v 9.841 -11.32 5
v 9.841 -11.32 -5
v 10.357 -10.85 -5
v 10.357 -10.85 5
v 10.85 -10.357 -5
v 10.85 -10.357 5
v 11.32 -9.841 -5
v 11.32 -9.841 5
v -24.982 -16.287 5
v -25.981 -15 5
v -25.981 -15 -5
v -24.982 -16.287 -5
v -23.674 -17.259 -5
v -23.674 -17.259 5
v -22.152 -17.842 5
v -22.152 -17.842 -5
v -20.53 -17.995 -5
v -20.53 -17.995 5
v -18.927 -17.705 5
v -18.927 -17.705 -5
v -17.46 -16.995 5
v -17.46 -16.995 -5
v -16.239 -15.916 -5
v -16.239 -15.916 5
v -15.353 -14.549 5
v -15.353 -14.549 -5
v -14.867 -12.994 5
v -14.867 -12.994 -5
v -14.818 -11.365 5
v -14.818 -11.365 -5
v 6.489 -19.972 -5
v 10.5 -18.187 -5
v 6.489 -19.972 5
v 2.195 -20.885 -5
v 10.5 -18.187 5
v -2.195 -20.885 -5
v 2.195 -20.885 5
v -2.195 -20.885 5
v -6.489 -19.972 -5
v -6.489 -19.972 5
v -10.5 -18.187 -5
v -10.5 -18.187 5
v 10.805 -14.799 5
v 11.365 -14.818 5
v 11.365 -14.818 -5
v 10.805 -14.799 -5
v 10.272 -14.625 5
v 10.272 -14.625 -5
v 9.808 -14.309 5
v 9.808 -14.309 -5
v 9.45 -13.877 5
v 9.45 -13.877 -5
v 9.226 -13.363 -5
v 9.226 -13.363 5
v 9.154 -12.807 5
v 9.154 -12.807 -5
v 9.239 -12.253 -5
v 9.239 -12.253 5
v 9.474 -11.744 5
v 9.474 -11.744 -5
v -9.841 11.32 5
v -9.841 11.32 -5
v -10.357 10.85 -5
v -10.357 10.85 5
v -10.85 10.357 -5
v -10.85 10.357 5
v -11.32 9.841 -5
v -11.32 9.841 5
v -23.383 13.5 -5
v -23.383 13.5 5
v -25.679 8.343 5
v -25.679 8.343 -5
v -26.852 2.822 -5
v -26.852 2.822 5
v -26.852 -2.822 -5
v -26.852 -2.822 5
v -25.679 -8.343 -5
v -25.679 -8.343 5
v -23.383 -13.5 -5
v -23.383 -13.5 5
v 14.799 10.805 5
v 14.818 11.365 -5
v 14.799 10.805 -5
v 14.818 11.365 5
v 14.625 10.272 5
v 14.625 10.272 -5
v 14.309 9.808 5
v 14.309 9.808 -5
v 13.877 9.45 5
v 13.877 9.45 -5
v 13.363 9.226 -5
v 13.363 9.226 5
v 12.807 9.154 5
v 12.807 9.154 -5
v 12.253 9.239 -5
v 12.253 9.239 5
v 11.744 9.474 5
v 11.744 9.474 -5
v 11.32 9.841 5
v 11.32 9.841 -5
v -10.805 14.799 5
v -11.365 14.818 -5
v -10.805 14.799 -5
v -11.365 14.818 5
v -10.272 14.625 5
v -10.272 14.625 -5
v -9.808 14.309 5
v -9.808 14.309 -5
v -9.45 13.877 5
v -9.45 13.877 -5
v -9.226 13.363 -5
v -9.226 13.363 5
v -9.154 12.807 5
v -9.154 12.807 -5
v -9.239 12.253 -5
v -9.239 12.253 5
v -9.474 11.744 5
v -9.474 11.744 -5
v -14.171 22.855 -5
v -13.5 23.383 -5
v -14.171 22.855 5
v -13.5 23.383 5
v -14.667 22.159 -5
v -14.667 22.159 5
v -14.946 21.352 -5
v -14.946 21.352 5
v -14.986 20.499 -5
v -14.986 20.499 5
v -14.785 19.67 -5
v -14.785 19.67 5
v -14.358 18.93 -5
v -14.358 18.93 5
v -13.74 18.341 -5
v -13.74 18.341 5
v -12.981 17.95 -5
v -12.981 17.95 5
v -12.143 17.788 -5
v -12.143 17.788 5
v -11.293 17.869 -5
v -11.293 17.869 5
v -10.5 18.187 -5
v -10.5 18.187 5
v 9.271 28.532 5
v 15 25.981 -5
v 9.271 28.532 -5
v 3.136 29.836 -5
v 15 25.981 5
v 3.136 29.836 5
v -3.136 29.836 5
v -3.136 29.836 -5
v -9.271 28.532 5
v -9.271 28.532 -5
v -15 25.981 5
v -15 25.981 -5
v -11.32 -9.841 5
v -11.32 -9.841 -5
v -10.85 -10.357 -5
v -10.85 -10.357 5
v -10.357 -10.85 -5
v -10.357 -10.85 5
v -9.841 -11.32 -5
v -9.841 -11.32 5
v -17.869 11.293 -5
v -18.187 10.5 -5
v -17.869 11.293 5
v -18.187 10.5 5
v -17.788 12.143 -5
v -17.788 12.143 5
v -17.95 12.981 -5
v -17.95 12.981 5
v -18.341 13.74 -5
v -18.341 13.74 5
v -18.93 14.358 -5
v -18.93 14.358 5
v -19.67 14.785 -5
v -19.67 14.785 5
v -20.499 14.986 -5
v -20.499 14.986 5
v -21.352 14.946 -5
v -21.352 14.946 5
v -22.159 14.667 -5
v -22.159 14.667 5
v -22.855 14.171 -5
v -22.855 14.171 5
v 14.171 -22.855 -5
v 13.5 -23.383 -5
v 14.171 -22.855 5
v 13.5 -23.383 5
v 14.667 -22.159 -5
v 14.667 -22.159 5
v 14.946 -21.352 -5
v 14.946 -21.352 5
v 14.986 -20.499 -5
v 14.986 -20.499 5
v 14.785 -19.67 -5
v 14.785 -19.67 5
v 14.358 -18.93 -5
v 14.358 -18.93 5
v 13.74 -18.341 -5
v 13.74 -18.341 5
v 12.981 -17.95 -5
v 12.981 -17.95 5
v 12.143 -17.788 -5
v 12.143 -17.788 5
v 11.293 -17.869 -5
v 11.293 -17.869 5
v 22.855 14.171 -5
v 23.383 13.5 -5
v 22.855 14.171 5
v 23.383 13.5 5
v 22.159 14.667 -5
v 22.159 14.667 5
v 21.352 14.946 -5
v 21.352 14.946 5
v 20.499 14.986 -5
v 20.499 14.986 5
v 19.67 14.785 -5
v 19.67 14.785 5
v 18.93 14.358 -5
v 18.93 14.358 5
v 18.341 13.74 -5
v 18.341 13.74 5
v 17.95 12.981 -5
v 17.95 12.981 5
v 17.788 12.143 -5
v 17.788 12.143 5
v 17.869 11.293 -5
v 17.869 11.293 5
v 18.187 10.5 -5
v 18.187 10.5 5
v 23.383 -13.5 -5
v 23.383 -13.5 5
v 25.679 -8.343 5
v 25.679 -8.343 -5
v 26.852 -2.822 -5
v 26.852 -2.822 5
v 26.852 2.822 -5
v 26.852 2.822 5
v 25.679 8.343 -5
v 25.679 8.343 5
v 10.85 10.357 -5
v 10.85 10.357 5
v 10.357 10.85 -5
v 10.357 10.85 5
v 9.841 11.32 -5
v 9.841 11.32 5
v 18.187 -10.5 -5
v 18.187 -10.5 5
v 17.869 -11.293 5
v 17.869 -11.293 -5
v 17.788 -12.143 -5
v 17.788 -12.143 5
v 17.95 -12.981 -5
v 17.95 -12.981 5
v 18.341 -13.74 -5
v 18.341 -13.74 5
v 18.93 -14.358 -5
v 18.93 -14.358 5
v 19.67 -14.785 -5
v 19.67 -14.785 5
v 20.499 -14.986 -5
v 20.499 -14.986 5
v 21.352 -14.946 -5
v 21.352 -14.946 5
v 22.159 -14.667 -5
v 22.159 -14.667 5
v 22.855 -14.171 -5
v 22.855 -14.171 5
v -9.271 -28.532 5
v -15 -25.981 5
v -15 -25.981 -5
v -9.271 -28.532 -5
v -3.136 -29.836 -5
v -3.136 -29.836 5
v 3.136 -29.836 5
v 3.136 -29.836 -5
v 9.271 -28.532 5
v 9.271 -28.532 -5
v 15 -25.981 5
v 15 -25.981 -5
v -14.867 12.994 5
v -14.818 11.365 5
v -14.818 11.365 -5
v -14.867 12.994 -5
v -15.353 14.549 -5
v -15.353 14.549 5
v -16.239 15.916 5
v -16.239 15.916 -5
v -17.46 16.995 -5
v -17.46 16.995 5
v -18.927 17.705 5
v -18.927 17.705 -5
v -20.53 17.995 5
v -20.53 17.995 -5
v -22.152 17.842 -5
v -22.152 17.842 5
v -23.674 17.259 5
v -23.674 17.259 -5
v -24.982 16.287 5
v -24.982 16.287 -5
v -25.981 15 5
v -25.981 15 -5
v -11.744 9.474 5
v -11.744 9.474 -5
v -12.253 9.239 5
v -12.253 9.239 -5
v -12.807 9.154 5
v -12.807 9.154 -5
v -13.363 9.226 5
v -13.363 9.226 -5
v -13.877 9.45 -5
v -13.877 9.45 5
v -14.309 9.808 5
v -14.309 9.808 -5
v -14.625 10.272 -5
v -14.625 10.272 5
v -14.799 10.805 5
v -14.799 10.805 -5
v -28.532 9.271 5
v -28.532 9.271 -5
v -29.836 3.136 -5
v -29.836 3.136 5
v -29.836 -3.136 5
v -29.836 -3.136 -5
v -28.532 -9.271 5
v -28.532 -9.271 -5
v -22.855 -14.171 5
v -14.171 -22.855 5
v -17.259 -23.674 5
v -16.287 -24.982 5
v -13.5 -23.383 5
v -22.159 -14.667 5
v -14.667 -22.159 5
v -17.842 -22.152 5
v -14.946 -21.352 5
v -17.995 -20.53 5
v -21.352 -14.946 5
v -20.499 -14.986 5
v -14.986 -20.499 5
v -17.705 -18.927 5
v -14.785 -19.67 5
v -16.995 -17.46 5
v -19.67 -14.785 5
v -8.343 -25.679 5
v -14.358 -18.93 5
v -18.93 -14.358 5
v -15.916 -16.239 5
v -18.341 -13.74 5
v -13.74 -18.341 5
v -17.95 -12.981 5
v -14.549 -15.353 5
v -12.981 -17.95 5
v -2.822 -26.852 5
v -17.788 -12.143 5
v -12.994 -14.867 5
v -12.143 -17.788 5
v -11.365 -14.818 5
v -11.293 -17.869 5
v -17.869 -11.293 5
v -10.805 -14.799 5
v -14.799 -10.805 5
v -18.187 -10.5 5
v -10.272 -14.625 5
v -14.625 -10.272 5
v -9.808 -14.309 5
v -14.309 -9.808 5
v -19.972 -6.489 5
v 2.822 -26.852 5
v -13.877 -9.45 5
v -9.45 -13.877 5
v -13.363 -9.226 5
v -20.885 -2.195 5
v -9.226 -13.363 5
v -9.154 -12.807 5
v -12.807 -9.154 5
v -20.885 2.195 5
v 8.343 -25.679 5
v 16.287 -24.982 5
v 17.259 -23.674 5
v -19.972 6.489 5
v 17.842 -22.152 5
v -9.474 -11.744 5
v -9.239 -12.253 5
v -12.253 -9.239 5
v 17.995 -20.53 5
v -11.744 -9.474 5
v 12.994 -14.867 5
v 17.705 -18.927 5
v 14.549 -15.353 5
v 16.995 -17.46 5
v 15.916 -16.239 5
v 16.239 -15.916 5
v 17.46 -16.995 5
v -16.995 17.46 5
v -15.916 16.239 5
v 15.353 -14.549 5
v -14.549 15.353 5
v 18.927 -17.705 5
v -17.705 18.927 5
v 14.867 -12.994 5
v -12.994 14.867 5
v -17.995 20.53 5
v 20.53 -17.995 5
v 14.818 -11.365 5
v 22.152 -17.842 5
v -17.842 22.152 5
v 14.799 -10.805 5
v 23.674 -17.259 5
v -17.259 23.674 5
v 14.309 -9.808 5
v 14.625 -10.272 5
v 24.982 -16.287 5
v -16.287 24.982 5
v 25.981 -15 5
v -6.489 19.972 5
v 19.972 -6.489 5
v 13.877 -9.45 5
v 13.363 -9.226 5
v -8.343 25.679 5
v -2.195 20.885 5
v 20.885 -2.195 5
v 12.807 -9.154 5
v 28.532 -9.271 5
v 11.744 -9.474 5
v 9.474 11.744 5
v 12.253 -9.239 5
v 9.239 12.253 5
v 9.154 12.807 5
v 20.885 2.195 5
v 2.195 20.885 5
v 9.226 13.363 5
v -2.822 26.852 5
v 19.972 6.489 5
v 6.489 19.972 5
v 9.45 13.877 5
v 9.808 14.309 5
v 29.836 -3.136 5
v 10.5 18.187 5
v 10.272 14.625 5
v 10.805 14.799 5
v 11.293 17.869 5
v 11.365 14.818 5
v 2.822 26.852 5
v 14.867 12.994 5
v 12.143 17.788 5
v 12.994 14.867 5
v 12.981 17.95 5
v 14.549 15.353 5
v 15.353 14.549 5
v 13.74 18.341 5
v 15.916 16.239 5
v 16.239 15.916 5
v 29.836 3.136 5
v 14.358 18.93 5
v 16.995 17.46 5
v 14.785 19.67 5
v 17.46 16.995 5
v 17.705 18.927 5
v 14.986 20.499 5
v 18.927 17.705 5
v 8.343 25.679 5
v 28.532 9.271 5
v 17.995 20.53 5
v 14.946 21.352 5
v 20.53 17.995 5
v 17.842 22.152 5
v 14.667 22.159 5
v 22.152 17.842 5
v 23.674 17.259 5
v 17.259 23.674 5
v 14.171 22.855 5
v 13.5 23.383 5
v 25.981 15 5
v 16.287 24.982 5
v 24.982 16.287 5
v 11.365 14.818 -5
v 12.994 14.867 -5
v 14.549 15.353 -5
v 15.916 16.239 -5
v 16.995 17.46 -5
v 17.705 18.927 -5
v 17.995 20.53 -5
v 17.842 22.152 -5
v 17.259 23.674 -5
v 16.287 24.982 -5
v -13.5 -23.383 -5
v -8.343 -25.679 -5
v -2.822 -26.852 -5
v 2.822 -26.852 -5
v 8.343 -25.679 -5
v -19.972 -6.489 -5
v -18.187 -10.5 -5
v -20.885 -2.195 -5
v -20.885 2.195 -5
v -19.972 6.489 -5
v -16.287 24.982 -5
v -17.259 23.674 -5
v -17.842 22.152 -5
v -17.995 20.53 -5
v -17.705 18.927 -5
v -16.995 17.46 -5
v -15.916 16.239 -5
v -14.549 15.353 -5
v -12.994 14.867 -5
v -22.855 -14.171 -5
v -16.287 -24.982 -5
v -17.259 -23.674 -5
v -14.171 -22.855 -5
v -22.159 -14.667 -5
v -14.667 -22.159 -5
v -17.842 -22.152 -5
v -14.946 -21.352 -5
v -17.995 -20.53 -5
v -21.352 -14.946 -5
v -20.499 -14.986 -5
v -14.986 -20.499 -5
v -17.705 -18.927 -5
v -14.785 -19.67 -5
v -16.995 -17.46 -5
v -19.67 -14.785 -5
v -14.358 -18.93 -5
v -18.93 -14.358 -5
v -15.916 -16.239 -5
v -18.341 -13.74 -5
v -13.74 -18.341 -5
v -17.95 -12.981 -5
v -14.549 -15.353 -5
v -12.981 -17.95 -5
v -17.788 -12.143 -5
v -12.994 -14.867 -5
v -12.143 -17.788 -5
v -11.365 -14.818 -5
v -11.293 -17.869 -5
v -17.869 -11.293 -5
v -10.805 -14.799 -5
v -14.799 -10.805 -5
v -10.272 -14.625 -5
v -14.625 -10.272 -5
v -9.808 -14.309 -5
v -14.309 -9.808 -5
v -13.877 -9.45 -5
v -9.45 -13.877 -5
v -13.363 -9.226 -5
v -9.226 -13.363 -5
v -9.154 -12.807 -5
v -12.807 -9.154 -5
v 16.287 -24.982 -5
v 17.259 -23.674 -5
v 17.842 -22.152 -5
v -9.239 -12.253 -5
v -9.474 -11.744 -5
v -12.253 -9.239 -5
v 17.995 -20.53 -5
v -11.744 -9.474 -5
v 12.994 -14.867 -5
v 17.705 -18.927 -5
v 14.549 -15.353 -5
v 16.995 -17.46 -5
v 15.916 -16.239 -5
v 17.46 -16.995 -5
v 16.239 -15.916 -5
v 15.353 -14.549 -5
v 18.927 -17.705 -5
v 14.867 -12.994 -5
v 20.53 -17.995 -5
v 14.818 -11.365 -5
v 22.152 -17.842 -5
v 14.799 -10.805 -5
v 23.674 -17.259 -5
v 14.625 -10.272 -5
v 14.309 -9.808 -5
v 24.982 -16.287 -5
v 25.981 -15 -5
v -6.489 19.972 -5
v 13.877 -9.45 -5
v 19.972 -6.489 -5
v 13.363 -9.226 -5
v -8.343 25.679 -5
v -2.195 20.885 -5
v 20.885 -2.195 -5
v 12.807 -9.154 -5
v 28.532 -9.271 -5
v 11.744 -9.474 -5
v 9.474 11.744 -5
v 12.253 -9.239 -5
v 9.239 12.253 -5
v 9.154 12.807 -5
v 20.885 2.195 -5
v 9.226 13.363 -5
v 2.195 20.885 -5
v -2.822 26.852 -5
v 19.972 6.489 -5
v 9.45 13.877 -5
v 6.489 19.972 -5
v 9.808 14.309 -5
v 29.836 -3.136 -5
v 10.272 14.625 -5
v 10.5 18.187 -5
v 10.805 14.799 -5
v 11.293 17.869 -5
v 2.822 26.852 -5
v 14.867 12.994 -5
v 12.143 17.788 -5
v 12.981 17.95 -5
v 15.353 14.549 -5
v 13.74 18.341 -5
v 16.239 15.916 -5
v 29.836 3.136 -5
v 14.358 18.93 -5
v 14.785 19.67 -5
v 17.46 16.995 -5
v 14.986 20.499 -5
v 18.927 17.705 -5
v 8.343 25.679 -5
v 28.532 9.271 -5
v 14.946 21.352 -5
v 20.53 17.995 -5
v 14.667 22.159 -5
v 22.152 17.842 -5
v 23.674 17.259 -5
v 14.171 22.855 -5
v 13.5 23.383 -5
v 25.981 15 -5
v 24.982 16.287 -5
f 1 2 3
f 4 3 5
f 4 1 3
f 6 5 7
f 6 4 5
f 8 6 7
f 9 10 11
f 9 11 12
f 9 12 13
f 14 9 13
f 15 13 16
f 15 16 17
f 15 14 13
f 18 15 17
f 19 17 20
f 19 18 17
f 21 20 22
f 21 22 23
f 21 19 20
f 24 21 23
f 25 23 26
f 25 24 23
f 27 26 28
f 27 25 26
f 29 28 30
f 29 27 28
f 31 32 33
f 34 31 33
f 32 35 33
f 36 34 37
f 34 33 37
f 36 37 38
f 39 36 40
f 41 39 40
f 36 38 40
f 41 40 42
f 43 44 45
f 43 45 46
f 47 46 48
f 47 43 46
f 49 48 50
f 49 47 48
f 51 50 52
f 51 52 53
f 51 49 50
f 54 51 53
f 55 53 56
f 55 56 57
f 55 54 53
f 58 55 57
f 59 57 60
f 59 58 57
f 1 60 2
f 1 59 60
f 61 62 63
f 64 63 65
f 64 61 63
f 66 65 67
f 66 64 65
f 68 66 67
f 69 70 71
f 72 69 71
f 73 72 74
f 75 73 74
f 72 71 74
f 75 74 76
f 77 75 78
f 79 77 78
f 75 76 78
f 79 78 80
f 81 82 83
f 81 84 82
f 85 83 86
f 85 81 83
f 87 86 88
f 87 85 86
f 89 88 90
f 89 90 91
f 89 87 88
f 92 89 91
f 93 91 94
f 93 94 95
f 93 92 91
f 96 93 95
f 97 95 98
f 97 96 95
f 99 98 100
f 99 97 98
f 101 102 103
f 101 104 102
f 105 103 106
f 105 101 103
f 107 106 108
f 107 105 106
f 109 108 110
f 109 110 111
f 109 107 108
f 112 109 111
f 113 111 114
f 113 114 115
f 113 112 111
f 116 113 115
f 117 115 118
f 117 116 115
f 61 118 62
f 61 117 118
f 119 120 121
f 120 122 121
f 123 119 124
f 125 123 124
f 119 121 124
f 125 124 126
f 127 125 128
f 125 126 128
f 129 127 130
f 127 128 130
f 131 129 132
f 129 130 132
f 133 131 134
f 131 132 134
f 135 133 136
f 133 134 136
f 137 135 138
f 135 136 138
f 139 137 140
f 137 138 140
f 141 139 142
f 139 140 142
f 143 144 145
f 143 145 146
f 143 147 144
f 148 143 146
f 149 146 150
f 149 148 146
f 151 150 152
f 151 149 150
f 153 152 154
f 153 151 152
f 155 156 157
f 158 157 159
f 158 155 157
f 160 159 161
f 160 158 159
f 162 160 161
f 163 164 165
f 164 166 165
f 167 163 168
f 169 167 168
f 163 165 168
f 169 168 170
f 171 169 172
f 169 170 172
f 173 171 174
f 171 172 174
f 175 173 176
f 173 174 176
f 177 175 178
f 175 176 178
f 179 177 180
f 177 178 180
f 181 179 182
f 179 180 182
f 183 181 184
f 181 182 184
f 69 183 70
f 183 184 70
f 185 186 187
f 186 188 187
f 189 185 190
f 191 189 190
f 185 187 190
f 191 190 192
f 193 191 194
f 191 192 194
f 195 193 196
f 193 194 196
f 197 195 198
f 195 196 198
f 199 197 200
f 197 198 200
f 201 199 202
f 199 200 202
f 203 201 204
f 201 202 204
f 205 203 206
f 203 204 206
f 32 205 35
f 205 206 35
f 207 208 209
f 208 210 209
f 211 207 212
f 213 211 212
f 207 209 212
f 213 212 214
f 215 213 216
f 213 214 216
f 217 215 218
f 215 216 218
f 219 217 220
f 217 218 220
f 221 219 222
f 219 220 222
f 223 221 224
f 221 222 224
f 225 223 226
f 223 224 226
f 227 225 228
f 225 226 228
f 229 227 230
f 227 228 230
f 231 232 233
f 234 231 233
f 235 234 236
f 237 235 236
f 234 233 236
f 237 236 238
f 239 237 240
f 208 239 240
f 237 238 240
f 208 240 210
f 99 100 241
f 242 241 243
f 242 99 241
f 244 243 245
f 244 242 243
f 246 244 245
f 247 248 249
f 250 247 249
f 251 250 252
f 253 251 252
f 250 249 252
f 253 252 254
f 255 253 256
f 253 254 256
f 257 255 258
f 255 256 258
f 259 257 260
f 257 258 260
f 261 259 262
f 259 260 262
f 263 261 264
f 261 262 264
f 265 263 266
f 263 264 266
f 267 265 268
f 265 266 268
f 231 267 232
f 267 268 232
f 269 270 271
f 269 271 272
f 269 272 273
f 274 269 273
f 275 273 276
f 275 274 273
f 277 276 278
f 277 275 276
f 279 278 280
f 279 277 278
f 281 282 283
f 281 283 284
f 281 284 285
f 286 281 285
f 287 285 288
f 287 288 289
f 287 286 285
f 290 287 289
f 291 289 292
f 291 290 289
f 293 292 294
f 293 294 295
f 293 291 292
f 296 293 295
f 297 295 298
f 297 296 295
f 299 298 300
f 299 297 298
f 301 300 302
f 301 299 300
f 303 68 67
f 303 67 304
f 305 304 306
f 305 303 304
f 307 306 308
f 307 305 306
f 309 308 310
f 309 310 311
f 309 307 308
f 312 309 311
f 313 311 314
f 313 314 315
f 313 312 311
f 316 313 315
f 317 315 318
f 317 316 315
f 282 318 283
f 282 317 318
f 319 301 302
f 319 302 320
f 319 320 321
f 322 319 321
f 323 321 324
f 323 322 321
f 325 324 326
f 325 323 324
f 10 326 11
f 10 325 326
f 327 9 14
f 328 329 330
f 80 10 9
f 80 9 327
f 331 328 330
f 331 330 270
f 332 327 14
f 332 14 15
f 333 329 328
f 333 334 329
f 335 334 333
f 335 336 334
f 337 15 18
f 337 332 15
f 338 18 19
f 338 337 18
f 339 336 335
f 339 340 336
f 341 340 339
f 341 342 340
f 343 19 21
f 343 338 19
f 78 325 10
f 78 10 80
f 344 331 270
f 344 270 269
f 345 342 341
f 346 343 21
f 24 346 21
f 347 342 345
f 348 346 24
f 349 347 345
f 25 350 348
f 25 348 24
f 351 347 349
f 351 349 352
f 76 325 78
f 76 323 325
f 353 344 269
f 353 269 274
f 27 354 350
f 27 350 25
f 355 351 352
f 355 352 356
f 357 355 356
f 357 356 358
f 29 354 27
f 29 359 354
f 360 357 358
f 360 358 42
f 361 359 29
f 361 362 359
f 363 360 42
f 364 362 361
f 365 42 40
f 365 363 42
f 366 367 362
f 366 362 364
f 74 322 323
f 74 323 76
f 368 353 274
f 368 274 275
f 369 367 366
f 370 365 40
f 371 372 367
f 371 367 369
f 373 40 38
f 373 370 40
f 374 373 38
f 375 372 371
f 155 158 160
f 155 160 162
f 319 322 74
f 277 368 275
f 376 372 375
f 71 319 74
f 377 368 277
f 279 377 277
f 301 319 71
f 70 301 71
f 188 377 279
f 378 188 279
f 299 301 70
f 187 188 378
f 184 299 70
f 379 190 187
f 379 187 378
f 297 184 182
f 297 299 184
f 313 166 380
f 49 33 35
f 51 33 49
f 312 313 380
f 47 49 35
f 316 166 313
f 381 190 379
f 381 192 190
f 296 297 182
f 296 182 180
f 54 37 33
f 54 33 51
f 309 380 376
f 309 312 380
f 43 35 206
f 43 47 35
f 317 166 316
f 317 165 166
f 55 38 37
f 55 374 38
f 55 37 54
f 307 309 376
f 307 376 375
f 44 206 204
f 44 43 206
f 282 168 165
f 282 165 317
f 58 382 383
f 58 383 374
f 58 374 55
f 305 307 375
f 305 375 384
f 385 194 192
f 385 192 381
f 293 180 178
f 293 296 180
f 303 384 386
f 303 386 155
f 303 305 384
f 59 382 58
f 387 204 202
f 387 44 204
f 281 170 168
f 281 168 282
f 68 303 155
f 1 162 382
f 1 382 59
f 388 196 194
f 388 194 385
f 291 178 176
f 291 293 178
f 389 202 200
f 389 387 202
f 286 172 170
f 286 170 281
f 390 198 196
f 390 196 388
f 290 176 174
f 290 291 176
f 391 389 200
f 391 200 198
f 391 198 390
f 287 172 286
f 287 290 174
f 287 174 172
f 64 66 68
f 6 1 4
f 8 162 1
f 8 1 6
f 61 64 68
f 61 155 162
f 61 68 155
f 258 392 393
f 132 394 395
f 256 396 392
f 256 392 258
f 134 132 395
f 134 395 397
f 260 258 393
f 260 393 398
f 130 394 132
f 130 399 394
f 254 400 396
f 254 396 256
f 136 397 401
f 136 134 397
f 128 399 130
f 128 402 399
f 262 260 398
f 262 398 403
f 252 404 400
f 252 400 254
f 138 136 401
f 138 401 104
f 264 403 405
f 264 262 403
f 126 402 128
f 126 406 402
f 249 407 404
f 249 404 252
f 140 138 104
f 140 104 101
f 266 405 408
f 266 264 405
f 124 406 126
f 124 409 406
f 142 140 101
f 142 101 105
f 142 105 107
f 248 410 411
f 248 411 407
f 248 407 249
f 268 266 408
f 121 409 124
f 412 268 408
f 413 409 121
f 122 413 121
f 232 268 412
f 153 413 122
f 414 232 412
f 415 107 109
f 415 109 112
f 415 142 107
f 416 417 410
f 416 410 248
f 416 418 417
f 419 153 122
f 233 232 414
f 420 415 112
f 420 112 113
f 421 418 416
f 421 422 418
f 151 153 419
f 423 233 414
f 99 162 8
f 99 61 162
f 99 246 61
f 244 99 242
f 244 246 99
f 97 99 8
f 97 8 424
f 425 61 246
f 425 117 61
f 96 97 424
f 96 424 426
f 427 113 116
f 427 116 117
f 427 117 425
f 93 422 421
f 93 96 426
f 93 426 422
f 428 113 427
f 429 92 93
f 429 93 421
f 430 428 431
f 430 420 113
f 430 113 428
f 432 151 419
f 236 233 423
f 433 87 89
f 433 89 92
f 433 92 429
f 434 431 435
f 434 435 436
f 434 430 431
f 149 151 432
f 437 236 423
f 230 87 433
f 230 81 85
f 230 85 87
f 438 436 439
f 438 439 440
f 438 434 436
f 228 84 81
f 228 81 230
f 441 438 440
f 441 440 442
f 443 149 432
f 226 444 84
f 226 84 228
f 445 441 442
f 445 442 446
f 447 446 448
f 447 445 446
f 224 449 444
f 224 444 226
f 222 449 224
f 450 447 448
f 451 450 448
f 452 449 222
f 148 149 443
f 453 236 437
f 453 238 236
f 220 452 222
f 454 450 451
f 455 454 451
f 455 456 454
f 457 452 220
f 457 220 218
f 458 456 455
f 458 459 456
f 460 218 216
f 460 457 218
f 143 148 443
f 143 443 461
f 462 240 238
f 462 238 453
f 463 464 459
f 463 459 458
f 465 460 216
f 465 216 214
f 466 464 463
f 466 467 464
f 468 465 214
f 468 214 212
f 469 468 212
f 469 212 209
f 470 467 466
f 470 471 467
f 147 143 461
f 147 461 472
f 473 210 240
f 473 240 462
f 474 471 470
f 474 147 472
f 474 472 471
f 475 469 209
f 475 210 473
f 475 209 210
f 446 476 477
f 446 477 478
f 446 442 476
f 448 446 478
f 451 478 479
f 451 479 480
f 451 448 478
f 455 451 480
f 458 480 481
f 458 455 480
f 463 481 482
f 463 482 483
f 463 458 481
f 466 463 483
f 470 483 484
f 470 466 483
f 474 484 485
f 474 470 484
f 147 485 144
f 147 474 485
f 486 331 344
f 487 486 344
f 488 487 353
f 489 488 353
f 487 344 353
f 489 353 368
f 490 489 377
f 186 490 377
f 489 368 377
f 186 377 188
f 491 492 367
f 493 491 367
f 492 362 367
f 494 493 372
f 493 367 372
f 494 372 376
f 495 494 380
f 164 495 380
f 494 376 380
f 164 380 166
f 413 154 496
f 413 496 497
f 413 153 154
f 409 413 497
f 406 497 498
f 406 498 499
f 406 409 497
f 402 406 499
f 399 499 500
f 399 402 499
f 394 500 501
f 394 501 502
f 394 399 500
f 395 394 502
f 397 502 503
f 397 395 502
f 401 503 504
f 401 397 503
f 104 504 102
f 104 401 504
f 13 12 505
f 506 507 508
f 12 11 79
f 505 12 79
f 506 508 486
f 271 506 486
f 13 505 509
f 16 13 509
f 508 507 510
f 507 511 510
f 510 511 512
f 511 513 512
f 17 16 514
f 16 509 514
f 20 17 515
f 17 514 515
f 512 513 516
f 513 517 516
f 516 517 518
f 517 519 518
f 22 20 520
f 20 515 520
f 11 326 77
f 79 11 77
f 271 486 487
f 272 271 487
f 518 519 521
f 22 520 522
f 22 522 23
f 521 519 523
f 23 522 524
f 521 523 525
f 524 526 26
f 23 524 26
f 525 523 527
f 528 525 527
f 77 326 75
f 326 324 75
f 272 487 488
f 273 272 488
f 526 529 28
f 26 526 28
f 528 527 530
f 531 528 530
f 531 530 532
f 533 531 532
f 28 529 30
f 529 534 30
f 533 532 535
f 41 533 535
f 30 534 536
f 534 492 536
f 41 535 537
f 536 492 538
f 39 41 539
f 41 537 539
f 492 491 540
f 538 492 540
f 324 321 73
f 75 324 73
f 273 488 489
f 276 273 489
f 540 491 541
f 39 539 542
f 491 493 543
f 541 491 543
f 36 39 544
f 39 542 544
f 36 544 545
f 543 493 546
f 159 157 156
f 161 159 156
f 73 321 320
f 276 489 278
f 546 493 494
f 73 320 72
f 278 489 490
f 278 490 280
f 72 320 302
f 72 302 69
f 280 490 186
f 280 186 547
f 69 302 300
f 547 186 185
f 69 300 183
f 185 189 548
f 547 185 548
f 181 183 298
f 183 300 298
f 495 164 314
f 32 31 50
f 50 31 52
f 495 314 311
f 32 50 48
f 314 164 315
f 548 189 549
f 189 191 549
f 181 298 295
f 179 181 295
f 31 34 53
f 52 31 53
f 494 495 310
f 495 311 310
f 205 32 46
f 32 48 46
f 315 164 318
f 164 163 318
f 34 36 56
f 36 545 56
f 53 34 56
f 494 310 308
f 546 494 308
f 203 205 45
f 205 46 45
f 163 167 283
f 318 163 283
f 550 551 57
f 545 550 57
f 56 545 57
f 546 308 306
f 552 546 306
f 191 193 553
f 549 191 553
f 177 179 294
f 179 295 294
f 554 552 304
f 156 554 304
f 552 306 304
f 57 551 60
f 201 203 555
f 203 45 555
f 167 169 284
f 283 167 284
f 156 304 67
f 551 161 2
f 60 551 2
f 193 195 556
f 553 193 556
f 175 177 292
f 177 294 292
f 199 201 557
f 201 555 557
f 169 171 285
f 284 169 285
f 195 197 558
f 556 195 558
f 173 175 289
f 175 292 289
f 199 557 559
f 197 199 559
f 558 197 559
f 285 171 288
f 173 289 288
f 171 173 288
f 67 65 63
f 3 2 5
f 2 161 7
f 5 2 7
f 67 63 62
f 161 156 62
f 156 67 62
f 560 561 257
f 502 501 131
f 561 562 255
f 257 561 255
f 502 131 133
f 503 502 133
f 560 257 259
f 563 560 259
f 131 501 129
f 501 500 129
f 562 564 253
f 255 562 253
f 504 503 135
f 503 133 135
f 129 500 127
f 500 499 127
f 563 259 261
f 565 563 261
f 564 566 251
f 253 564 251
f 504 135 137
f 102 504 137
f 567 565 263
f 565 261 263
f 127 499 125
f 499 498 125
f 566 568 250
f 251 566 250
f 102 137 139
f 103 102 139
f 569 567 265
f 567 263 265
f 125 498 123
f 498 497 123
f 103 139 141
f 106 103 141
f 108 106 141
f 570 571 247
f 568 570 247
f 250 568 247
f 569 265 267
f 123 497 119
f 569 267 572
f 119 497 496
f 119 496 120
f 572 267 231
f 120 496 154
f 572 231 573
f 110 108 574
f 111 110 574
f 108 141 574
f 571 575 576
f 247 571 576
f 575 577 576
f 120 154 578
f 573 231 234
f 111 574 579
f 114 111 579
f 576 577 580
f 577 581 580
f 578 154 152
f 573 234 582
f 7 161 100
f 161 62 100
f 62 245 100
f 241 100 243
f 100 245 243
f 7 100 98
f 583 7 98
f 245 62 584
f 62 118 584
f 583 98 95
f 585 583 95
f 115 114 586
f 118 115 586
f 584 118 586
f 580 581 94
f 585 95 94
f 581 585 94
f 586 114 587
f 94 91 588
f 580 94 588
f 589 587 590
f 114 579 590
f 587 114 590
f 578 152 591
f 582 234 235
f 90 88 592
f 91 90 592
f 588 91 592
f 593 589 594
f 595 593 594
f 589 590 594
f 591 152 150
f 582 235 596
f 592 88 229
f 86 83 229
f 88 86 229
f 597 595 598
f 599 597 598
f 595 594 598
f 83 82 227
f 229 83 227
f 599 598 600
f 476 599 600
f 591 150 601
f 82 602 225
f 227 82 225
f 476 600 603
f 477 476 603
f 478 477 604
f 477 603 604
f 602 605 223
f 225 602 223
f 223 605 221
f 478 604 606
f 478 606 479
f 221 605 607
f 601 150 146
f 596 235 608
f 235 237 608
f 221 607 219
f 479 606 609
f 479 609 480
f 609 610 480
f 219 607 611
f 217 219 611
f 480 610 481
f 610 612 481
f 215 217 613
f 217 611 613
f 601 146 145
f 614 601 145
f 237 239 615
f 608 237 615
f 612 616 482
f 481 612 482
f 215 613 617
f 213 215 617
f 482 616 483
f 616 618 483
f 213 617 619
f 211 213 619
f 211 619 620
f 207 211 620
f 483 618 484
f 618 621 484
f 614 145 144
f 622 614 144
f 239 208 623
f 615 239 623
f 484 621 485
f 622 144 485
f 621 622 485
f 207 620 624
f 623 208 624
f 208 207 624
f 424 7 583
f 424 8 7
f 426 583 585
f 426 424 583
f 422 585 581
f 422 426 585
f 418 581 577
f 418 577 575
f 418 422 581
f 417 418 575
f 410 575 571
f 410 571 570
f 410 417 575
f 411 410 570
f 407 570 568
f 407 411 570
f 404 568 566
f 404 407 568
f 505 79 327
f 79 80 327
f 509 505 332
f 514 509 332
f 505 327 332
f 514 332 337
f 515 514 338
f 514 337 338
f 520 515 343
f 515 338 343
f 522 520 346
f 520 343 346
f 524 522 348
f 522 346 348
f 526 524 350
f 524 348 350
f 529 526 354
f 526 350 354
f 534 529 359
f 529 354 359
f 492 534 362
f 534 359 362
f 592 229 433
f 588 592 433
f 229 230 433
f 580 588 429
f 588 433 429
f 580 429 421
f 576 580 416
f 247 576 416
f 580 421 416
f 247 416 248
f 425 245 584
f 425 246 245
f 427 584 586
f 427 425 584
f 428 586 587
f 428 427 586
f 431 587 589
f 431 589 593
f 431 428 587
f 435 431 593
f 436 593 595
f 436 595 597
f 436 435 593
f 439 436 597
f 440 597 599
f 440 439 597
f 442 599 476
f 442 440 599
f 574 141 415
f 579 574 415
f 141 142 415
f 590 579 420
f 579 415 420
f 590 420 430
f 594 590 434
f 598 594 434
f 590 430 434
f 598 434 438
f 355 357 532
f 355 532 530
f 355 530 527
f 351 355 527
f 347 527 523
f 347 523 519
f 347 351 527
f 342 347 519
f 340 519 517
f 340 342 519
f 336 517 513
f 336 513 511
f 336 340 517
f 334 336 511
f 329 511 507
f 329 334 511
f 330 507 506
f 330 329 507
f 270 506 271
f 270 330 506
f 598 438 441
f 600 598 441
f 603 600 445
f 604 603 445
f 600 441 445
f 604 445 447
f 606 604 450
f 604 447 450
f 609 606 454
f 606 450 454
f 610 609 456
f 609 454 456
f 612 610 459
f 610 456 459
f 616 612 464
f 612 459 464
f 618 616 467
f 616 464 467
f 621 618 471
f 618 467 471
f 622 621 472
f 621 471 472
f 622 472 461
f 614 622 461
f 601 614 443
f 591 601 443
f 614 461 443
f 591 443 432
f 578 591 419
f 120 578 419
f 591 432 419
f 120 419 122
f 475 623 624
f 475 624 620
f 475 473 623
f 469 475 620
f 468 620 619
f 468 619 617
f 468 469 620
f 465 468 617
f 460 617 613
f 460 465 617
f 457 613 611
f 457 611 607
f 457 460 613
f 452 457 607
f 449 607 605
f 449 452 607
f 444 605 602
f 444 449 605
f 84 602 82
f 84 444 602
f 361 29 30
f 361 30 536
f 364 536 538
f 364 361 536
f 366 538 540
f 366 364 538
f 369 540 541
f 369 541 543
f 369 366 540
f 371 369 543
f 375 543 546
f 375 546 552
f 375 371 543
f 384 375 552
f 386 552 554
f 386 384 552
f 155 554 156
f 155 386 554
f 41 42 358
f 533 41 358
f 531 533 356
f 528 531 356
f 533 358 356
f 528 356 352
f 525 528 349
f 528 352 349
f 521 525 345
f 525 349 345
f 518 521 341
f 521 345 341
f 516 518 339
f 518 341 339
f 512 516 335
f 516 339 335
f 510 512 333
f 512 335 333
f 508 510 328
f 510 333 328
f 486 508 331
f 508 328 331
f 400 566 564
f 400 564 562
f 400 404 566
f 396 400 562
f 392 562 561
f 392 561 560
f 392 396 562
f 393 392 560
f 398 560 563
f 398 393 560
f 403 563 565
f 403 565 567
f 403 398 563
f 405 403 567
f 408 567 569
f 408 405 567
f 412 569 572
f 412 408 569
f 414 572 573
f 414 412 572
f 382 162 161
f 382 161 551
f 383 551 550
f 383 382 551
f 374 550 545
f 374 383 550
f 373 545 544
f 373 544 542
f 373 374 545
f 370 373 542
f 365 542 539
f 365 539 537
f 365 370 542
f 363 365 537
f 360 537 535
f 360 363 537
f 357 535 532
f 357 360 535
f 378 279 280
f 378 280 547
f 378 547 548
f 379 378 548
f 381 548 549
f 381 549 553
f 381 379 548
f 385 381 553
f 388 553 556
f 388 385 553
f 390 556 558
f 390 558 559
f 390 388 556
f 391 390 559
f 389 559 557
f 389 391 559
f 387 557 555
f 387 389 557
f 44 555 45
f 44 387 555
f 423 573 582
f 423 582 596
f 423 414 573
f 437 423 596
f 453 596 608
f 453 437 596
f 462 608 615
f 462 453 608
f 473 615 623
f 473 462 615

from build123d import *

# Parameters (mm, degrees)
BOSS_EXTRUDE1_DEPTH = 5


with BuildPart() as part:
    # Sketch1 → Boss-Extrude1 (new, symmetric)
    with BuildSketch(Plane.XY):
        with BuildLine():
            ThreePointArc((-9.841451141, 11.320151918), (-10.606601718, 10.606601718), (-11.320151918, 9.841451141))
            ThreePointArc((-11.320151918, 9.841451141), (-13.628216731, 9.32005242), (-14.818281553, 11.36523347))
            ThreePointArc((-14.818281553, 11.36523347), (-18.926875967, 17.70515779), (-25.980762114, 15))
            ThreePointArc((-25.980762114, 15), (-30, 0), (-25.980762114, -15))
            ThreePointArc((-25.980762114, -15), (-18.926875967, -17.70515779), (-14.818281553, -11.36523347))
            ThreePointArc((-14.818281553, -11.36523347), (-13.628216731, -9.32005242), (-11.320151918, -9.841451141))
            ThreePointArc((-11.320151918, -9.841451141), (-10.606601718, -10.606601718), (-9.841451141, -11.320151918))
            ThreePointArc((-9.841451141, -11.320151918), (-9.32005242, -13.628216731), (-11.36523347, -14.818281553))
            ThreePointArc((-11.36523347, -14.818281553), (-17.70515779, -18.926875967), (-15, -25.980762114))
            ThreePointArc((-15, -25.980762114), (0, -30), (15, -25.980762114))
            ThreePointArc((15, -25.980762114), (17.70515779, -18.926875967), (11.36523347, -14.818281553))
            ThreePointArc((11.36523347, -14.818281553), (9.32005242, -13.628216731), (9.841451141, -11.320151918))
            ThreePointArc((9.841451141, -11.320151918), (10.606601718, -10.606601718), (11.320151918, -9.841451141))
            ThreePointArc((11.320151918, -9.841451141), (13.628216731, -9.32005242), (14.818281553, -11.36523347))
            ThreePointArc((14.818281553, -11.36523347), (18.926875967, -17.70515779), (25.980762114, -15))
            ThreePointArc((25.980762114, -15), (30, 0), (25.980762114, 15))
            ThreePointArc((25.980762114, 15), (18.926875967, 17.70515779), (14.818281553, 11.36523347))
            ThreePointArc((14.818281553, 11.36523347), (13.628216731, 9.32005242), (11.320151918, 9.841451141))
            ThreePointArc((11.320151918, 9.841451141), (10.606601718, 10.606601718), (9.841451141, 11.320151918))
            ThreePointArc((9.841451141, 11.320151918), (9.32005242, 13.628216731), (11.36523347, 14.818281553))
            ThreePointArc((11.36523347, 14.818281553), (17.70515779, 18.926875967), (15, 25.980762114))
            ThreePointArc((15, 25.980762114), (0, 30), (-15, 25.980762114))
            ThreePointArc((-15, 25.980762114), (-17.70515779, 18.926875967), (-11.36523347, 14.818281553))
            ThreePointArc((-11.36523347, 14.818281553), (-9.32005242, 13.628216731), (-9.841451141, 11.320151918))
        make_face()
        with BuildLine():
            ThreePointArc((13.5, 23.382685902), (0, 27), (-13.5, 23.382685902))
            ThreePointArc((-13.5, 23.382685902), (-14.598076211, 19.284609691), (-10.5, 18.186533479))
            ThreePointArc((-10.5, 18.186533479), (0, 21), (10.5, 18.186533479))
            ThreePointArc((10.5, 18.186533479), (14.598076211, 19.284609691), (13.5, 23.382685902))
        make_face(mode=Mode.SUBTRACT)
        with BuildLine():
            ThreePointArc((23.382685902, -13.5), (27, 0), (23.382685902, 13.5))
            ThreePointArc((23.382685902, 13.5), (19.284609691, 14.598076211), (18.186533479, 10.5))
            ThreePointArc((18.186533479, 10.5), (21, 0), (18.186533479, -10.5))
            ThreePointArc((18.186533479, -10.5), (19.284609691, -14.598076211), (23.382685902, -13.5))
        make_face(mode=Mode.SUBTRACT)
        with BuildLine():
            ThreePointArc((-13.5, -23.382685902), (0, -27), (13.5, -23.382685902))
            ThreePointArc((13.5, -23.382685902), (14.598076211, -19.284609691), (10.5, -18.186533479))
            ThreePointArc((10.5, -18.186533479), (0, -21), (-10.5, -18.186533479))
            ThreePointArc((-10.5, -18.186533479), (-14.598076211, -19.284609691), (-13.5, -23.382685902))
        make_face(mode=Mode.SUBTRACT)
        with BuildLine():
            ThreePointArc((-23.382685902, 13.5), (-27, 0), (-23.382685902, -13.5))
            ThreePointArc((-23.382685902, -13.5), (-19.284609691, -14.598076211), (-18.186533479, -10.5))
            ThreePointArc((-18.186533479, -10.5), (-21, 0), (-18.186533479, 10.5))
            ThreePointArc((-18.186533479, 10.5), (-19.284609691, 14.598076211), (-23.382685902, 13.5))
        make_face(mode=Mode.SUBTRACT)
    extrude(amount=BOSS_EXTRUDE1_DEPTH, both=True)


solid = part.part
